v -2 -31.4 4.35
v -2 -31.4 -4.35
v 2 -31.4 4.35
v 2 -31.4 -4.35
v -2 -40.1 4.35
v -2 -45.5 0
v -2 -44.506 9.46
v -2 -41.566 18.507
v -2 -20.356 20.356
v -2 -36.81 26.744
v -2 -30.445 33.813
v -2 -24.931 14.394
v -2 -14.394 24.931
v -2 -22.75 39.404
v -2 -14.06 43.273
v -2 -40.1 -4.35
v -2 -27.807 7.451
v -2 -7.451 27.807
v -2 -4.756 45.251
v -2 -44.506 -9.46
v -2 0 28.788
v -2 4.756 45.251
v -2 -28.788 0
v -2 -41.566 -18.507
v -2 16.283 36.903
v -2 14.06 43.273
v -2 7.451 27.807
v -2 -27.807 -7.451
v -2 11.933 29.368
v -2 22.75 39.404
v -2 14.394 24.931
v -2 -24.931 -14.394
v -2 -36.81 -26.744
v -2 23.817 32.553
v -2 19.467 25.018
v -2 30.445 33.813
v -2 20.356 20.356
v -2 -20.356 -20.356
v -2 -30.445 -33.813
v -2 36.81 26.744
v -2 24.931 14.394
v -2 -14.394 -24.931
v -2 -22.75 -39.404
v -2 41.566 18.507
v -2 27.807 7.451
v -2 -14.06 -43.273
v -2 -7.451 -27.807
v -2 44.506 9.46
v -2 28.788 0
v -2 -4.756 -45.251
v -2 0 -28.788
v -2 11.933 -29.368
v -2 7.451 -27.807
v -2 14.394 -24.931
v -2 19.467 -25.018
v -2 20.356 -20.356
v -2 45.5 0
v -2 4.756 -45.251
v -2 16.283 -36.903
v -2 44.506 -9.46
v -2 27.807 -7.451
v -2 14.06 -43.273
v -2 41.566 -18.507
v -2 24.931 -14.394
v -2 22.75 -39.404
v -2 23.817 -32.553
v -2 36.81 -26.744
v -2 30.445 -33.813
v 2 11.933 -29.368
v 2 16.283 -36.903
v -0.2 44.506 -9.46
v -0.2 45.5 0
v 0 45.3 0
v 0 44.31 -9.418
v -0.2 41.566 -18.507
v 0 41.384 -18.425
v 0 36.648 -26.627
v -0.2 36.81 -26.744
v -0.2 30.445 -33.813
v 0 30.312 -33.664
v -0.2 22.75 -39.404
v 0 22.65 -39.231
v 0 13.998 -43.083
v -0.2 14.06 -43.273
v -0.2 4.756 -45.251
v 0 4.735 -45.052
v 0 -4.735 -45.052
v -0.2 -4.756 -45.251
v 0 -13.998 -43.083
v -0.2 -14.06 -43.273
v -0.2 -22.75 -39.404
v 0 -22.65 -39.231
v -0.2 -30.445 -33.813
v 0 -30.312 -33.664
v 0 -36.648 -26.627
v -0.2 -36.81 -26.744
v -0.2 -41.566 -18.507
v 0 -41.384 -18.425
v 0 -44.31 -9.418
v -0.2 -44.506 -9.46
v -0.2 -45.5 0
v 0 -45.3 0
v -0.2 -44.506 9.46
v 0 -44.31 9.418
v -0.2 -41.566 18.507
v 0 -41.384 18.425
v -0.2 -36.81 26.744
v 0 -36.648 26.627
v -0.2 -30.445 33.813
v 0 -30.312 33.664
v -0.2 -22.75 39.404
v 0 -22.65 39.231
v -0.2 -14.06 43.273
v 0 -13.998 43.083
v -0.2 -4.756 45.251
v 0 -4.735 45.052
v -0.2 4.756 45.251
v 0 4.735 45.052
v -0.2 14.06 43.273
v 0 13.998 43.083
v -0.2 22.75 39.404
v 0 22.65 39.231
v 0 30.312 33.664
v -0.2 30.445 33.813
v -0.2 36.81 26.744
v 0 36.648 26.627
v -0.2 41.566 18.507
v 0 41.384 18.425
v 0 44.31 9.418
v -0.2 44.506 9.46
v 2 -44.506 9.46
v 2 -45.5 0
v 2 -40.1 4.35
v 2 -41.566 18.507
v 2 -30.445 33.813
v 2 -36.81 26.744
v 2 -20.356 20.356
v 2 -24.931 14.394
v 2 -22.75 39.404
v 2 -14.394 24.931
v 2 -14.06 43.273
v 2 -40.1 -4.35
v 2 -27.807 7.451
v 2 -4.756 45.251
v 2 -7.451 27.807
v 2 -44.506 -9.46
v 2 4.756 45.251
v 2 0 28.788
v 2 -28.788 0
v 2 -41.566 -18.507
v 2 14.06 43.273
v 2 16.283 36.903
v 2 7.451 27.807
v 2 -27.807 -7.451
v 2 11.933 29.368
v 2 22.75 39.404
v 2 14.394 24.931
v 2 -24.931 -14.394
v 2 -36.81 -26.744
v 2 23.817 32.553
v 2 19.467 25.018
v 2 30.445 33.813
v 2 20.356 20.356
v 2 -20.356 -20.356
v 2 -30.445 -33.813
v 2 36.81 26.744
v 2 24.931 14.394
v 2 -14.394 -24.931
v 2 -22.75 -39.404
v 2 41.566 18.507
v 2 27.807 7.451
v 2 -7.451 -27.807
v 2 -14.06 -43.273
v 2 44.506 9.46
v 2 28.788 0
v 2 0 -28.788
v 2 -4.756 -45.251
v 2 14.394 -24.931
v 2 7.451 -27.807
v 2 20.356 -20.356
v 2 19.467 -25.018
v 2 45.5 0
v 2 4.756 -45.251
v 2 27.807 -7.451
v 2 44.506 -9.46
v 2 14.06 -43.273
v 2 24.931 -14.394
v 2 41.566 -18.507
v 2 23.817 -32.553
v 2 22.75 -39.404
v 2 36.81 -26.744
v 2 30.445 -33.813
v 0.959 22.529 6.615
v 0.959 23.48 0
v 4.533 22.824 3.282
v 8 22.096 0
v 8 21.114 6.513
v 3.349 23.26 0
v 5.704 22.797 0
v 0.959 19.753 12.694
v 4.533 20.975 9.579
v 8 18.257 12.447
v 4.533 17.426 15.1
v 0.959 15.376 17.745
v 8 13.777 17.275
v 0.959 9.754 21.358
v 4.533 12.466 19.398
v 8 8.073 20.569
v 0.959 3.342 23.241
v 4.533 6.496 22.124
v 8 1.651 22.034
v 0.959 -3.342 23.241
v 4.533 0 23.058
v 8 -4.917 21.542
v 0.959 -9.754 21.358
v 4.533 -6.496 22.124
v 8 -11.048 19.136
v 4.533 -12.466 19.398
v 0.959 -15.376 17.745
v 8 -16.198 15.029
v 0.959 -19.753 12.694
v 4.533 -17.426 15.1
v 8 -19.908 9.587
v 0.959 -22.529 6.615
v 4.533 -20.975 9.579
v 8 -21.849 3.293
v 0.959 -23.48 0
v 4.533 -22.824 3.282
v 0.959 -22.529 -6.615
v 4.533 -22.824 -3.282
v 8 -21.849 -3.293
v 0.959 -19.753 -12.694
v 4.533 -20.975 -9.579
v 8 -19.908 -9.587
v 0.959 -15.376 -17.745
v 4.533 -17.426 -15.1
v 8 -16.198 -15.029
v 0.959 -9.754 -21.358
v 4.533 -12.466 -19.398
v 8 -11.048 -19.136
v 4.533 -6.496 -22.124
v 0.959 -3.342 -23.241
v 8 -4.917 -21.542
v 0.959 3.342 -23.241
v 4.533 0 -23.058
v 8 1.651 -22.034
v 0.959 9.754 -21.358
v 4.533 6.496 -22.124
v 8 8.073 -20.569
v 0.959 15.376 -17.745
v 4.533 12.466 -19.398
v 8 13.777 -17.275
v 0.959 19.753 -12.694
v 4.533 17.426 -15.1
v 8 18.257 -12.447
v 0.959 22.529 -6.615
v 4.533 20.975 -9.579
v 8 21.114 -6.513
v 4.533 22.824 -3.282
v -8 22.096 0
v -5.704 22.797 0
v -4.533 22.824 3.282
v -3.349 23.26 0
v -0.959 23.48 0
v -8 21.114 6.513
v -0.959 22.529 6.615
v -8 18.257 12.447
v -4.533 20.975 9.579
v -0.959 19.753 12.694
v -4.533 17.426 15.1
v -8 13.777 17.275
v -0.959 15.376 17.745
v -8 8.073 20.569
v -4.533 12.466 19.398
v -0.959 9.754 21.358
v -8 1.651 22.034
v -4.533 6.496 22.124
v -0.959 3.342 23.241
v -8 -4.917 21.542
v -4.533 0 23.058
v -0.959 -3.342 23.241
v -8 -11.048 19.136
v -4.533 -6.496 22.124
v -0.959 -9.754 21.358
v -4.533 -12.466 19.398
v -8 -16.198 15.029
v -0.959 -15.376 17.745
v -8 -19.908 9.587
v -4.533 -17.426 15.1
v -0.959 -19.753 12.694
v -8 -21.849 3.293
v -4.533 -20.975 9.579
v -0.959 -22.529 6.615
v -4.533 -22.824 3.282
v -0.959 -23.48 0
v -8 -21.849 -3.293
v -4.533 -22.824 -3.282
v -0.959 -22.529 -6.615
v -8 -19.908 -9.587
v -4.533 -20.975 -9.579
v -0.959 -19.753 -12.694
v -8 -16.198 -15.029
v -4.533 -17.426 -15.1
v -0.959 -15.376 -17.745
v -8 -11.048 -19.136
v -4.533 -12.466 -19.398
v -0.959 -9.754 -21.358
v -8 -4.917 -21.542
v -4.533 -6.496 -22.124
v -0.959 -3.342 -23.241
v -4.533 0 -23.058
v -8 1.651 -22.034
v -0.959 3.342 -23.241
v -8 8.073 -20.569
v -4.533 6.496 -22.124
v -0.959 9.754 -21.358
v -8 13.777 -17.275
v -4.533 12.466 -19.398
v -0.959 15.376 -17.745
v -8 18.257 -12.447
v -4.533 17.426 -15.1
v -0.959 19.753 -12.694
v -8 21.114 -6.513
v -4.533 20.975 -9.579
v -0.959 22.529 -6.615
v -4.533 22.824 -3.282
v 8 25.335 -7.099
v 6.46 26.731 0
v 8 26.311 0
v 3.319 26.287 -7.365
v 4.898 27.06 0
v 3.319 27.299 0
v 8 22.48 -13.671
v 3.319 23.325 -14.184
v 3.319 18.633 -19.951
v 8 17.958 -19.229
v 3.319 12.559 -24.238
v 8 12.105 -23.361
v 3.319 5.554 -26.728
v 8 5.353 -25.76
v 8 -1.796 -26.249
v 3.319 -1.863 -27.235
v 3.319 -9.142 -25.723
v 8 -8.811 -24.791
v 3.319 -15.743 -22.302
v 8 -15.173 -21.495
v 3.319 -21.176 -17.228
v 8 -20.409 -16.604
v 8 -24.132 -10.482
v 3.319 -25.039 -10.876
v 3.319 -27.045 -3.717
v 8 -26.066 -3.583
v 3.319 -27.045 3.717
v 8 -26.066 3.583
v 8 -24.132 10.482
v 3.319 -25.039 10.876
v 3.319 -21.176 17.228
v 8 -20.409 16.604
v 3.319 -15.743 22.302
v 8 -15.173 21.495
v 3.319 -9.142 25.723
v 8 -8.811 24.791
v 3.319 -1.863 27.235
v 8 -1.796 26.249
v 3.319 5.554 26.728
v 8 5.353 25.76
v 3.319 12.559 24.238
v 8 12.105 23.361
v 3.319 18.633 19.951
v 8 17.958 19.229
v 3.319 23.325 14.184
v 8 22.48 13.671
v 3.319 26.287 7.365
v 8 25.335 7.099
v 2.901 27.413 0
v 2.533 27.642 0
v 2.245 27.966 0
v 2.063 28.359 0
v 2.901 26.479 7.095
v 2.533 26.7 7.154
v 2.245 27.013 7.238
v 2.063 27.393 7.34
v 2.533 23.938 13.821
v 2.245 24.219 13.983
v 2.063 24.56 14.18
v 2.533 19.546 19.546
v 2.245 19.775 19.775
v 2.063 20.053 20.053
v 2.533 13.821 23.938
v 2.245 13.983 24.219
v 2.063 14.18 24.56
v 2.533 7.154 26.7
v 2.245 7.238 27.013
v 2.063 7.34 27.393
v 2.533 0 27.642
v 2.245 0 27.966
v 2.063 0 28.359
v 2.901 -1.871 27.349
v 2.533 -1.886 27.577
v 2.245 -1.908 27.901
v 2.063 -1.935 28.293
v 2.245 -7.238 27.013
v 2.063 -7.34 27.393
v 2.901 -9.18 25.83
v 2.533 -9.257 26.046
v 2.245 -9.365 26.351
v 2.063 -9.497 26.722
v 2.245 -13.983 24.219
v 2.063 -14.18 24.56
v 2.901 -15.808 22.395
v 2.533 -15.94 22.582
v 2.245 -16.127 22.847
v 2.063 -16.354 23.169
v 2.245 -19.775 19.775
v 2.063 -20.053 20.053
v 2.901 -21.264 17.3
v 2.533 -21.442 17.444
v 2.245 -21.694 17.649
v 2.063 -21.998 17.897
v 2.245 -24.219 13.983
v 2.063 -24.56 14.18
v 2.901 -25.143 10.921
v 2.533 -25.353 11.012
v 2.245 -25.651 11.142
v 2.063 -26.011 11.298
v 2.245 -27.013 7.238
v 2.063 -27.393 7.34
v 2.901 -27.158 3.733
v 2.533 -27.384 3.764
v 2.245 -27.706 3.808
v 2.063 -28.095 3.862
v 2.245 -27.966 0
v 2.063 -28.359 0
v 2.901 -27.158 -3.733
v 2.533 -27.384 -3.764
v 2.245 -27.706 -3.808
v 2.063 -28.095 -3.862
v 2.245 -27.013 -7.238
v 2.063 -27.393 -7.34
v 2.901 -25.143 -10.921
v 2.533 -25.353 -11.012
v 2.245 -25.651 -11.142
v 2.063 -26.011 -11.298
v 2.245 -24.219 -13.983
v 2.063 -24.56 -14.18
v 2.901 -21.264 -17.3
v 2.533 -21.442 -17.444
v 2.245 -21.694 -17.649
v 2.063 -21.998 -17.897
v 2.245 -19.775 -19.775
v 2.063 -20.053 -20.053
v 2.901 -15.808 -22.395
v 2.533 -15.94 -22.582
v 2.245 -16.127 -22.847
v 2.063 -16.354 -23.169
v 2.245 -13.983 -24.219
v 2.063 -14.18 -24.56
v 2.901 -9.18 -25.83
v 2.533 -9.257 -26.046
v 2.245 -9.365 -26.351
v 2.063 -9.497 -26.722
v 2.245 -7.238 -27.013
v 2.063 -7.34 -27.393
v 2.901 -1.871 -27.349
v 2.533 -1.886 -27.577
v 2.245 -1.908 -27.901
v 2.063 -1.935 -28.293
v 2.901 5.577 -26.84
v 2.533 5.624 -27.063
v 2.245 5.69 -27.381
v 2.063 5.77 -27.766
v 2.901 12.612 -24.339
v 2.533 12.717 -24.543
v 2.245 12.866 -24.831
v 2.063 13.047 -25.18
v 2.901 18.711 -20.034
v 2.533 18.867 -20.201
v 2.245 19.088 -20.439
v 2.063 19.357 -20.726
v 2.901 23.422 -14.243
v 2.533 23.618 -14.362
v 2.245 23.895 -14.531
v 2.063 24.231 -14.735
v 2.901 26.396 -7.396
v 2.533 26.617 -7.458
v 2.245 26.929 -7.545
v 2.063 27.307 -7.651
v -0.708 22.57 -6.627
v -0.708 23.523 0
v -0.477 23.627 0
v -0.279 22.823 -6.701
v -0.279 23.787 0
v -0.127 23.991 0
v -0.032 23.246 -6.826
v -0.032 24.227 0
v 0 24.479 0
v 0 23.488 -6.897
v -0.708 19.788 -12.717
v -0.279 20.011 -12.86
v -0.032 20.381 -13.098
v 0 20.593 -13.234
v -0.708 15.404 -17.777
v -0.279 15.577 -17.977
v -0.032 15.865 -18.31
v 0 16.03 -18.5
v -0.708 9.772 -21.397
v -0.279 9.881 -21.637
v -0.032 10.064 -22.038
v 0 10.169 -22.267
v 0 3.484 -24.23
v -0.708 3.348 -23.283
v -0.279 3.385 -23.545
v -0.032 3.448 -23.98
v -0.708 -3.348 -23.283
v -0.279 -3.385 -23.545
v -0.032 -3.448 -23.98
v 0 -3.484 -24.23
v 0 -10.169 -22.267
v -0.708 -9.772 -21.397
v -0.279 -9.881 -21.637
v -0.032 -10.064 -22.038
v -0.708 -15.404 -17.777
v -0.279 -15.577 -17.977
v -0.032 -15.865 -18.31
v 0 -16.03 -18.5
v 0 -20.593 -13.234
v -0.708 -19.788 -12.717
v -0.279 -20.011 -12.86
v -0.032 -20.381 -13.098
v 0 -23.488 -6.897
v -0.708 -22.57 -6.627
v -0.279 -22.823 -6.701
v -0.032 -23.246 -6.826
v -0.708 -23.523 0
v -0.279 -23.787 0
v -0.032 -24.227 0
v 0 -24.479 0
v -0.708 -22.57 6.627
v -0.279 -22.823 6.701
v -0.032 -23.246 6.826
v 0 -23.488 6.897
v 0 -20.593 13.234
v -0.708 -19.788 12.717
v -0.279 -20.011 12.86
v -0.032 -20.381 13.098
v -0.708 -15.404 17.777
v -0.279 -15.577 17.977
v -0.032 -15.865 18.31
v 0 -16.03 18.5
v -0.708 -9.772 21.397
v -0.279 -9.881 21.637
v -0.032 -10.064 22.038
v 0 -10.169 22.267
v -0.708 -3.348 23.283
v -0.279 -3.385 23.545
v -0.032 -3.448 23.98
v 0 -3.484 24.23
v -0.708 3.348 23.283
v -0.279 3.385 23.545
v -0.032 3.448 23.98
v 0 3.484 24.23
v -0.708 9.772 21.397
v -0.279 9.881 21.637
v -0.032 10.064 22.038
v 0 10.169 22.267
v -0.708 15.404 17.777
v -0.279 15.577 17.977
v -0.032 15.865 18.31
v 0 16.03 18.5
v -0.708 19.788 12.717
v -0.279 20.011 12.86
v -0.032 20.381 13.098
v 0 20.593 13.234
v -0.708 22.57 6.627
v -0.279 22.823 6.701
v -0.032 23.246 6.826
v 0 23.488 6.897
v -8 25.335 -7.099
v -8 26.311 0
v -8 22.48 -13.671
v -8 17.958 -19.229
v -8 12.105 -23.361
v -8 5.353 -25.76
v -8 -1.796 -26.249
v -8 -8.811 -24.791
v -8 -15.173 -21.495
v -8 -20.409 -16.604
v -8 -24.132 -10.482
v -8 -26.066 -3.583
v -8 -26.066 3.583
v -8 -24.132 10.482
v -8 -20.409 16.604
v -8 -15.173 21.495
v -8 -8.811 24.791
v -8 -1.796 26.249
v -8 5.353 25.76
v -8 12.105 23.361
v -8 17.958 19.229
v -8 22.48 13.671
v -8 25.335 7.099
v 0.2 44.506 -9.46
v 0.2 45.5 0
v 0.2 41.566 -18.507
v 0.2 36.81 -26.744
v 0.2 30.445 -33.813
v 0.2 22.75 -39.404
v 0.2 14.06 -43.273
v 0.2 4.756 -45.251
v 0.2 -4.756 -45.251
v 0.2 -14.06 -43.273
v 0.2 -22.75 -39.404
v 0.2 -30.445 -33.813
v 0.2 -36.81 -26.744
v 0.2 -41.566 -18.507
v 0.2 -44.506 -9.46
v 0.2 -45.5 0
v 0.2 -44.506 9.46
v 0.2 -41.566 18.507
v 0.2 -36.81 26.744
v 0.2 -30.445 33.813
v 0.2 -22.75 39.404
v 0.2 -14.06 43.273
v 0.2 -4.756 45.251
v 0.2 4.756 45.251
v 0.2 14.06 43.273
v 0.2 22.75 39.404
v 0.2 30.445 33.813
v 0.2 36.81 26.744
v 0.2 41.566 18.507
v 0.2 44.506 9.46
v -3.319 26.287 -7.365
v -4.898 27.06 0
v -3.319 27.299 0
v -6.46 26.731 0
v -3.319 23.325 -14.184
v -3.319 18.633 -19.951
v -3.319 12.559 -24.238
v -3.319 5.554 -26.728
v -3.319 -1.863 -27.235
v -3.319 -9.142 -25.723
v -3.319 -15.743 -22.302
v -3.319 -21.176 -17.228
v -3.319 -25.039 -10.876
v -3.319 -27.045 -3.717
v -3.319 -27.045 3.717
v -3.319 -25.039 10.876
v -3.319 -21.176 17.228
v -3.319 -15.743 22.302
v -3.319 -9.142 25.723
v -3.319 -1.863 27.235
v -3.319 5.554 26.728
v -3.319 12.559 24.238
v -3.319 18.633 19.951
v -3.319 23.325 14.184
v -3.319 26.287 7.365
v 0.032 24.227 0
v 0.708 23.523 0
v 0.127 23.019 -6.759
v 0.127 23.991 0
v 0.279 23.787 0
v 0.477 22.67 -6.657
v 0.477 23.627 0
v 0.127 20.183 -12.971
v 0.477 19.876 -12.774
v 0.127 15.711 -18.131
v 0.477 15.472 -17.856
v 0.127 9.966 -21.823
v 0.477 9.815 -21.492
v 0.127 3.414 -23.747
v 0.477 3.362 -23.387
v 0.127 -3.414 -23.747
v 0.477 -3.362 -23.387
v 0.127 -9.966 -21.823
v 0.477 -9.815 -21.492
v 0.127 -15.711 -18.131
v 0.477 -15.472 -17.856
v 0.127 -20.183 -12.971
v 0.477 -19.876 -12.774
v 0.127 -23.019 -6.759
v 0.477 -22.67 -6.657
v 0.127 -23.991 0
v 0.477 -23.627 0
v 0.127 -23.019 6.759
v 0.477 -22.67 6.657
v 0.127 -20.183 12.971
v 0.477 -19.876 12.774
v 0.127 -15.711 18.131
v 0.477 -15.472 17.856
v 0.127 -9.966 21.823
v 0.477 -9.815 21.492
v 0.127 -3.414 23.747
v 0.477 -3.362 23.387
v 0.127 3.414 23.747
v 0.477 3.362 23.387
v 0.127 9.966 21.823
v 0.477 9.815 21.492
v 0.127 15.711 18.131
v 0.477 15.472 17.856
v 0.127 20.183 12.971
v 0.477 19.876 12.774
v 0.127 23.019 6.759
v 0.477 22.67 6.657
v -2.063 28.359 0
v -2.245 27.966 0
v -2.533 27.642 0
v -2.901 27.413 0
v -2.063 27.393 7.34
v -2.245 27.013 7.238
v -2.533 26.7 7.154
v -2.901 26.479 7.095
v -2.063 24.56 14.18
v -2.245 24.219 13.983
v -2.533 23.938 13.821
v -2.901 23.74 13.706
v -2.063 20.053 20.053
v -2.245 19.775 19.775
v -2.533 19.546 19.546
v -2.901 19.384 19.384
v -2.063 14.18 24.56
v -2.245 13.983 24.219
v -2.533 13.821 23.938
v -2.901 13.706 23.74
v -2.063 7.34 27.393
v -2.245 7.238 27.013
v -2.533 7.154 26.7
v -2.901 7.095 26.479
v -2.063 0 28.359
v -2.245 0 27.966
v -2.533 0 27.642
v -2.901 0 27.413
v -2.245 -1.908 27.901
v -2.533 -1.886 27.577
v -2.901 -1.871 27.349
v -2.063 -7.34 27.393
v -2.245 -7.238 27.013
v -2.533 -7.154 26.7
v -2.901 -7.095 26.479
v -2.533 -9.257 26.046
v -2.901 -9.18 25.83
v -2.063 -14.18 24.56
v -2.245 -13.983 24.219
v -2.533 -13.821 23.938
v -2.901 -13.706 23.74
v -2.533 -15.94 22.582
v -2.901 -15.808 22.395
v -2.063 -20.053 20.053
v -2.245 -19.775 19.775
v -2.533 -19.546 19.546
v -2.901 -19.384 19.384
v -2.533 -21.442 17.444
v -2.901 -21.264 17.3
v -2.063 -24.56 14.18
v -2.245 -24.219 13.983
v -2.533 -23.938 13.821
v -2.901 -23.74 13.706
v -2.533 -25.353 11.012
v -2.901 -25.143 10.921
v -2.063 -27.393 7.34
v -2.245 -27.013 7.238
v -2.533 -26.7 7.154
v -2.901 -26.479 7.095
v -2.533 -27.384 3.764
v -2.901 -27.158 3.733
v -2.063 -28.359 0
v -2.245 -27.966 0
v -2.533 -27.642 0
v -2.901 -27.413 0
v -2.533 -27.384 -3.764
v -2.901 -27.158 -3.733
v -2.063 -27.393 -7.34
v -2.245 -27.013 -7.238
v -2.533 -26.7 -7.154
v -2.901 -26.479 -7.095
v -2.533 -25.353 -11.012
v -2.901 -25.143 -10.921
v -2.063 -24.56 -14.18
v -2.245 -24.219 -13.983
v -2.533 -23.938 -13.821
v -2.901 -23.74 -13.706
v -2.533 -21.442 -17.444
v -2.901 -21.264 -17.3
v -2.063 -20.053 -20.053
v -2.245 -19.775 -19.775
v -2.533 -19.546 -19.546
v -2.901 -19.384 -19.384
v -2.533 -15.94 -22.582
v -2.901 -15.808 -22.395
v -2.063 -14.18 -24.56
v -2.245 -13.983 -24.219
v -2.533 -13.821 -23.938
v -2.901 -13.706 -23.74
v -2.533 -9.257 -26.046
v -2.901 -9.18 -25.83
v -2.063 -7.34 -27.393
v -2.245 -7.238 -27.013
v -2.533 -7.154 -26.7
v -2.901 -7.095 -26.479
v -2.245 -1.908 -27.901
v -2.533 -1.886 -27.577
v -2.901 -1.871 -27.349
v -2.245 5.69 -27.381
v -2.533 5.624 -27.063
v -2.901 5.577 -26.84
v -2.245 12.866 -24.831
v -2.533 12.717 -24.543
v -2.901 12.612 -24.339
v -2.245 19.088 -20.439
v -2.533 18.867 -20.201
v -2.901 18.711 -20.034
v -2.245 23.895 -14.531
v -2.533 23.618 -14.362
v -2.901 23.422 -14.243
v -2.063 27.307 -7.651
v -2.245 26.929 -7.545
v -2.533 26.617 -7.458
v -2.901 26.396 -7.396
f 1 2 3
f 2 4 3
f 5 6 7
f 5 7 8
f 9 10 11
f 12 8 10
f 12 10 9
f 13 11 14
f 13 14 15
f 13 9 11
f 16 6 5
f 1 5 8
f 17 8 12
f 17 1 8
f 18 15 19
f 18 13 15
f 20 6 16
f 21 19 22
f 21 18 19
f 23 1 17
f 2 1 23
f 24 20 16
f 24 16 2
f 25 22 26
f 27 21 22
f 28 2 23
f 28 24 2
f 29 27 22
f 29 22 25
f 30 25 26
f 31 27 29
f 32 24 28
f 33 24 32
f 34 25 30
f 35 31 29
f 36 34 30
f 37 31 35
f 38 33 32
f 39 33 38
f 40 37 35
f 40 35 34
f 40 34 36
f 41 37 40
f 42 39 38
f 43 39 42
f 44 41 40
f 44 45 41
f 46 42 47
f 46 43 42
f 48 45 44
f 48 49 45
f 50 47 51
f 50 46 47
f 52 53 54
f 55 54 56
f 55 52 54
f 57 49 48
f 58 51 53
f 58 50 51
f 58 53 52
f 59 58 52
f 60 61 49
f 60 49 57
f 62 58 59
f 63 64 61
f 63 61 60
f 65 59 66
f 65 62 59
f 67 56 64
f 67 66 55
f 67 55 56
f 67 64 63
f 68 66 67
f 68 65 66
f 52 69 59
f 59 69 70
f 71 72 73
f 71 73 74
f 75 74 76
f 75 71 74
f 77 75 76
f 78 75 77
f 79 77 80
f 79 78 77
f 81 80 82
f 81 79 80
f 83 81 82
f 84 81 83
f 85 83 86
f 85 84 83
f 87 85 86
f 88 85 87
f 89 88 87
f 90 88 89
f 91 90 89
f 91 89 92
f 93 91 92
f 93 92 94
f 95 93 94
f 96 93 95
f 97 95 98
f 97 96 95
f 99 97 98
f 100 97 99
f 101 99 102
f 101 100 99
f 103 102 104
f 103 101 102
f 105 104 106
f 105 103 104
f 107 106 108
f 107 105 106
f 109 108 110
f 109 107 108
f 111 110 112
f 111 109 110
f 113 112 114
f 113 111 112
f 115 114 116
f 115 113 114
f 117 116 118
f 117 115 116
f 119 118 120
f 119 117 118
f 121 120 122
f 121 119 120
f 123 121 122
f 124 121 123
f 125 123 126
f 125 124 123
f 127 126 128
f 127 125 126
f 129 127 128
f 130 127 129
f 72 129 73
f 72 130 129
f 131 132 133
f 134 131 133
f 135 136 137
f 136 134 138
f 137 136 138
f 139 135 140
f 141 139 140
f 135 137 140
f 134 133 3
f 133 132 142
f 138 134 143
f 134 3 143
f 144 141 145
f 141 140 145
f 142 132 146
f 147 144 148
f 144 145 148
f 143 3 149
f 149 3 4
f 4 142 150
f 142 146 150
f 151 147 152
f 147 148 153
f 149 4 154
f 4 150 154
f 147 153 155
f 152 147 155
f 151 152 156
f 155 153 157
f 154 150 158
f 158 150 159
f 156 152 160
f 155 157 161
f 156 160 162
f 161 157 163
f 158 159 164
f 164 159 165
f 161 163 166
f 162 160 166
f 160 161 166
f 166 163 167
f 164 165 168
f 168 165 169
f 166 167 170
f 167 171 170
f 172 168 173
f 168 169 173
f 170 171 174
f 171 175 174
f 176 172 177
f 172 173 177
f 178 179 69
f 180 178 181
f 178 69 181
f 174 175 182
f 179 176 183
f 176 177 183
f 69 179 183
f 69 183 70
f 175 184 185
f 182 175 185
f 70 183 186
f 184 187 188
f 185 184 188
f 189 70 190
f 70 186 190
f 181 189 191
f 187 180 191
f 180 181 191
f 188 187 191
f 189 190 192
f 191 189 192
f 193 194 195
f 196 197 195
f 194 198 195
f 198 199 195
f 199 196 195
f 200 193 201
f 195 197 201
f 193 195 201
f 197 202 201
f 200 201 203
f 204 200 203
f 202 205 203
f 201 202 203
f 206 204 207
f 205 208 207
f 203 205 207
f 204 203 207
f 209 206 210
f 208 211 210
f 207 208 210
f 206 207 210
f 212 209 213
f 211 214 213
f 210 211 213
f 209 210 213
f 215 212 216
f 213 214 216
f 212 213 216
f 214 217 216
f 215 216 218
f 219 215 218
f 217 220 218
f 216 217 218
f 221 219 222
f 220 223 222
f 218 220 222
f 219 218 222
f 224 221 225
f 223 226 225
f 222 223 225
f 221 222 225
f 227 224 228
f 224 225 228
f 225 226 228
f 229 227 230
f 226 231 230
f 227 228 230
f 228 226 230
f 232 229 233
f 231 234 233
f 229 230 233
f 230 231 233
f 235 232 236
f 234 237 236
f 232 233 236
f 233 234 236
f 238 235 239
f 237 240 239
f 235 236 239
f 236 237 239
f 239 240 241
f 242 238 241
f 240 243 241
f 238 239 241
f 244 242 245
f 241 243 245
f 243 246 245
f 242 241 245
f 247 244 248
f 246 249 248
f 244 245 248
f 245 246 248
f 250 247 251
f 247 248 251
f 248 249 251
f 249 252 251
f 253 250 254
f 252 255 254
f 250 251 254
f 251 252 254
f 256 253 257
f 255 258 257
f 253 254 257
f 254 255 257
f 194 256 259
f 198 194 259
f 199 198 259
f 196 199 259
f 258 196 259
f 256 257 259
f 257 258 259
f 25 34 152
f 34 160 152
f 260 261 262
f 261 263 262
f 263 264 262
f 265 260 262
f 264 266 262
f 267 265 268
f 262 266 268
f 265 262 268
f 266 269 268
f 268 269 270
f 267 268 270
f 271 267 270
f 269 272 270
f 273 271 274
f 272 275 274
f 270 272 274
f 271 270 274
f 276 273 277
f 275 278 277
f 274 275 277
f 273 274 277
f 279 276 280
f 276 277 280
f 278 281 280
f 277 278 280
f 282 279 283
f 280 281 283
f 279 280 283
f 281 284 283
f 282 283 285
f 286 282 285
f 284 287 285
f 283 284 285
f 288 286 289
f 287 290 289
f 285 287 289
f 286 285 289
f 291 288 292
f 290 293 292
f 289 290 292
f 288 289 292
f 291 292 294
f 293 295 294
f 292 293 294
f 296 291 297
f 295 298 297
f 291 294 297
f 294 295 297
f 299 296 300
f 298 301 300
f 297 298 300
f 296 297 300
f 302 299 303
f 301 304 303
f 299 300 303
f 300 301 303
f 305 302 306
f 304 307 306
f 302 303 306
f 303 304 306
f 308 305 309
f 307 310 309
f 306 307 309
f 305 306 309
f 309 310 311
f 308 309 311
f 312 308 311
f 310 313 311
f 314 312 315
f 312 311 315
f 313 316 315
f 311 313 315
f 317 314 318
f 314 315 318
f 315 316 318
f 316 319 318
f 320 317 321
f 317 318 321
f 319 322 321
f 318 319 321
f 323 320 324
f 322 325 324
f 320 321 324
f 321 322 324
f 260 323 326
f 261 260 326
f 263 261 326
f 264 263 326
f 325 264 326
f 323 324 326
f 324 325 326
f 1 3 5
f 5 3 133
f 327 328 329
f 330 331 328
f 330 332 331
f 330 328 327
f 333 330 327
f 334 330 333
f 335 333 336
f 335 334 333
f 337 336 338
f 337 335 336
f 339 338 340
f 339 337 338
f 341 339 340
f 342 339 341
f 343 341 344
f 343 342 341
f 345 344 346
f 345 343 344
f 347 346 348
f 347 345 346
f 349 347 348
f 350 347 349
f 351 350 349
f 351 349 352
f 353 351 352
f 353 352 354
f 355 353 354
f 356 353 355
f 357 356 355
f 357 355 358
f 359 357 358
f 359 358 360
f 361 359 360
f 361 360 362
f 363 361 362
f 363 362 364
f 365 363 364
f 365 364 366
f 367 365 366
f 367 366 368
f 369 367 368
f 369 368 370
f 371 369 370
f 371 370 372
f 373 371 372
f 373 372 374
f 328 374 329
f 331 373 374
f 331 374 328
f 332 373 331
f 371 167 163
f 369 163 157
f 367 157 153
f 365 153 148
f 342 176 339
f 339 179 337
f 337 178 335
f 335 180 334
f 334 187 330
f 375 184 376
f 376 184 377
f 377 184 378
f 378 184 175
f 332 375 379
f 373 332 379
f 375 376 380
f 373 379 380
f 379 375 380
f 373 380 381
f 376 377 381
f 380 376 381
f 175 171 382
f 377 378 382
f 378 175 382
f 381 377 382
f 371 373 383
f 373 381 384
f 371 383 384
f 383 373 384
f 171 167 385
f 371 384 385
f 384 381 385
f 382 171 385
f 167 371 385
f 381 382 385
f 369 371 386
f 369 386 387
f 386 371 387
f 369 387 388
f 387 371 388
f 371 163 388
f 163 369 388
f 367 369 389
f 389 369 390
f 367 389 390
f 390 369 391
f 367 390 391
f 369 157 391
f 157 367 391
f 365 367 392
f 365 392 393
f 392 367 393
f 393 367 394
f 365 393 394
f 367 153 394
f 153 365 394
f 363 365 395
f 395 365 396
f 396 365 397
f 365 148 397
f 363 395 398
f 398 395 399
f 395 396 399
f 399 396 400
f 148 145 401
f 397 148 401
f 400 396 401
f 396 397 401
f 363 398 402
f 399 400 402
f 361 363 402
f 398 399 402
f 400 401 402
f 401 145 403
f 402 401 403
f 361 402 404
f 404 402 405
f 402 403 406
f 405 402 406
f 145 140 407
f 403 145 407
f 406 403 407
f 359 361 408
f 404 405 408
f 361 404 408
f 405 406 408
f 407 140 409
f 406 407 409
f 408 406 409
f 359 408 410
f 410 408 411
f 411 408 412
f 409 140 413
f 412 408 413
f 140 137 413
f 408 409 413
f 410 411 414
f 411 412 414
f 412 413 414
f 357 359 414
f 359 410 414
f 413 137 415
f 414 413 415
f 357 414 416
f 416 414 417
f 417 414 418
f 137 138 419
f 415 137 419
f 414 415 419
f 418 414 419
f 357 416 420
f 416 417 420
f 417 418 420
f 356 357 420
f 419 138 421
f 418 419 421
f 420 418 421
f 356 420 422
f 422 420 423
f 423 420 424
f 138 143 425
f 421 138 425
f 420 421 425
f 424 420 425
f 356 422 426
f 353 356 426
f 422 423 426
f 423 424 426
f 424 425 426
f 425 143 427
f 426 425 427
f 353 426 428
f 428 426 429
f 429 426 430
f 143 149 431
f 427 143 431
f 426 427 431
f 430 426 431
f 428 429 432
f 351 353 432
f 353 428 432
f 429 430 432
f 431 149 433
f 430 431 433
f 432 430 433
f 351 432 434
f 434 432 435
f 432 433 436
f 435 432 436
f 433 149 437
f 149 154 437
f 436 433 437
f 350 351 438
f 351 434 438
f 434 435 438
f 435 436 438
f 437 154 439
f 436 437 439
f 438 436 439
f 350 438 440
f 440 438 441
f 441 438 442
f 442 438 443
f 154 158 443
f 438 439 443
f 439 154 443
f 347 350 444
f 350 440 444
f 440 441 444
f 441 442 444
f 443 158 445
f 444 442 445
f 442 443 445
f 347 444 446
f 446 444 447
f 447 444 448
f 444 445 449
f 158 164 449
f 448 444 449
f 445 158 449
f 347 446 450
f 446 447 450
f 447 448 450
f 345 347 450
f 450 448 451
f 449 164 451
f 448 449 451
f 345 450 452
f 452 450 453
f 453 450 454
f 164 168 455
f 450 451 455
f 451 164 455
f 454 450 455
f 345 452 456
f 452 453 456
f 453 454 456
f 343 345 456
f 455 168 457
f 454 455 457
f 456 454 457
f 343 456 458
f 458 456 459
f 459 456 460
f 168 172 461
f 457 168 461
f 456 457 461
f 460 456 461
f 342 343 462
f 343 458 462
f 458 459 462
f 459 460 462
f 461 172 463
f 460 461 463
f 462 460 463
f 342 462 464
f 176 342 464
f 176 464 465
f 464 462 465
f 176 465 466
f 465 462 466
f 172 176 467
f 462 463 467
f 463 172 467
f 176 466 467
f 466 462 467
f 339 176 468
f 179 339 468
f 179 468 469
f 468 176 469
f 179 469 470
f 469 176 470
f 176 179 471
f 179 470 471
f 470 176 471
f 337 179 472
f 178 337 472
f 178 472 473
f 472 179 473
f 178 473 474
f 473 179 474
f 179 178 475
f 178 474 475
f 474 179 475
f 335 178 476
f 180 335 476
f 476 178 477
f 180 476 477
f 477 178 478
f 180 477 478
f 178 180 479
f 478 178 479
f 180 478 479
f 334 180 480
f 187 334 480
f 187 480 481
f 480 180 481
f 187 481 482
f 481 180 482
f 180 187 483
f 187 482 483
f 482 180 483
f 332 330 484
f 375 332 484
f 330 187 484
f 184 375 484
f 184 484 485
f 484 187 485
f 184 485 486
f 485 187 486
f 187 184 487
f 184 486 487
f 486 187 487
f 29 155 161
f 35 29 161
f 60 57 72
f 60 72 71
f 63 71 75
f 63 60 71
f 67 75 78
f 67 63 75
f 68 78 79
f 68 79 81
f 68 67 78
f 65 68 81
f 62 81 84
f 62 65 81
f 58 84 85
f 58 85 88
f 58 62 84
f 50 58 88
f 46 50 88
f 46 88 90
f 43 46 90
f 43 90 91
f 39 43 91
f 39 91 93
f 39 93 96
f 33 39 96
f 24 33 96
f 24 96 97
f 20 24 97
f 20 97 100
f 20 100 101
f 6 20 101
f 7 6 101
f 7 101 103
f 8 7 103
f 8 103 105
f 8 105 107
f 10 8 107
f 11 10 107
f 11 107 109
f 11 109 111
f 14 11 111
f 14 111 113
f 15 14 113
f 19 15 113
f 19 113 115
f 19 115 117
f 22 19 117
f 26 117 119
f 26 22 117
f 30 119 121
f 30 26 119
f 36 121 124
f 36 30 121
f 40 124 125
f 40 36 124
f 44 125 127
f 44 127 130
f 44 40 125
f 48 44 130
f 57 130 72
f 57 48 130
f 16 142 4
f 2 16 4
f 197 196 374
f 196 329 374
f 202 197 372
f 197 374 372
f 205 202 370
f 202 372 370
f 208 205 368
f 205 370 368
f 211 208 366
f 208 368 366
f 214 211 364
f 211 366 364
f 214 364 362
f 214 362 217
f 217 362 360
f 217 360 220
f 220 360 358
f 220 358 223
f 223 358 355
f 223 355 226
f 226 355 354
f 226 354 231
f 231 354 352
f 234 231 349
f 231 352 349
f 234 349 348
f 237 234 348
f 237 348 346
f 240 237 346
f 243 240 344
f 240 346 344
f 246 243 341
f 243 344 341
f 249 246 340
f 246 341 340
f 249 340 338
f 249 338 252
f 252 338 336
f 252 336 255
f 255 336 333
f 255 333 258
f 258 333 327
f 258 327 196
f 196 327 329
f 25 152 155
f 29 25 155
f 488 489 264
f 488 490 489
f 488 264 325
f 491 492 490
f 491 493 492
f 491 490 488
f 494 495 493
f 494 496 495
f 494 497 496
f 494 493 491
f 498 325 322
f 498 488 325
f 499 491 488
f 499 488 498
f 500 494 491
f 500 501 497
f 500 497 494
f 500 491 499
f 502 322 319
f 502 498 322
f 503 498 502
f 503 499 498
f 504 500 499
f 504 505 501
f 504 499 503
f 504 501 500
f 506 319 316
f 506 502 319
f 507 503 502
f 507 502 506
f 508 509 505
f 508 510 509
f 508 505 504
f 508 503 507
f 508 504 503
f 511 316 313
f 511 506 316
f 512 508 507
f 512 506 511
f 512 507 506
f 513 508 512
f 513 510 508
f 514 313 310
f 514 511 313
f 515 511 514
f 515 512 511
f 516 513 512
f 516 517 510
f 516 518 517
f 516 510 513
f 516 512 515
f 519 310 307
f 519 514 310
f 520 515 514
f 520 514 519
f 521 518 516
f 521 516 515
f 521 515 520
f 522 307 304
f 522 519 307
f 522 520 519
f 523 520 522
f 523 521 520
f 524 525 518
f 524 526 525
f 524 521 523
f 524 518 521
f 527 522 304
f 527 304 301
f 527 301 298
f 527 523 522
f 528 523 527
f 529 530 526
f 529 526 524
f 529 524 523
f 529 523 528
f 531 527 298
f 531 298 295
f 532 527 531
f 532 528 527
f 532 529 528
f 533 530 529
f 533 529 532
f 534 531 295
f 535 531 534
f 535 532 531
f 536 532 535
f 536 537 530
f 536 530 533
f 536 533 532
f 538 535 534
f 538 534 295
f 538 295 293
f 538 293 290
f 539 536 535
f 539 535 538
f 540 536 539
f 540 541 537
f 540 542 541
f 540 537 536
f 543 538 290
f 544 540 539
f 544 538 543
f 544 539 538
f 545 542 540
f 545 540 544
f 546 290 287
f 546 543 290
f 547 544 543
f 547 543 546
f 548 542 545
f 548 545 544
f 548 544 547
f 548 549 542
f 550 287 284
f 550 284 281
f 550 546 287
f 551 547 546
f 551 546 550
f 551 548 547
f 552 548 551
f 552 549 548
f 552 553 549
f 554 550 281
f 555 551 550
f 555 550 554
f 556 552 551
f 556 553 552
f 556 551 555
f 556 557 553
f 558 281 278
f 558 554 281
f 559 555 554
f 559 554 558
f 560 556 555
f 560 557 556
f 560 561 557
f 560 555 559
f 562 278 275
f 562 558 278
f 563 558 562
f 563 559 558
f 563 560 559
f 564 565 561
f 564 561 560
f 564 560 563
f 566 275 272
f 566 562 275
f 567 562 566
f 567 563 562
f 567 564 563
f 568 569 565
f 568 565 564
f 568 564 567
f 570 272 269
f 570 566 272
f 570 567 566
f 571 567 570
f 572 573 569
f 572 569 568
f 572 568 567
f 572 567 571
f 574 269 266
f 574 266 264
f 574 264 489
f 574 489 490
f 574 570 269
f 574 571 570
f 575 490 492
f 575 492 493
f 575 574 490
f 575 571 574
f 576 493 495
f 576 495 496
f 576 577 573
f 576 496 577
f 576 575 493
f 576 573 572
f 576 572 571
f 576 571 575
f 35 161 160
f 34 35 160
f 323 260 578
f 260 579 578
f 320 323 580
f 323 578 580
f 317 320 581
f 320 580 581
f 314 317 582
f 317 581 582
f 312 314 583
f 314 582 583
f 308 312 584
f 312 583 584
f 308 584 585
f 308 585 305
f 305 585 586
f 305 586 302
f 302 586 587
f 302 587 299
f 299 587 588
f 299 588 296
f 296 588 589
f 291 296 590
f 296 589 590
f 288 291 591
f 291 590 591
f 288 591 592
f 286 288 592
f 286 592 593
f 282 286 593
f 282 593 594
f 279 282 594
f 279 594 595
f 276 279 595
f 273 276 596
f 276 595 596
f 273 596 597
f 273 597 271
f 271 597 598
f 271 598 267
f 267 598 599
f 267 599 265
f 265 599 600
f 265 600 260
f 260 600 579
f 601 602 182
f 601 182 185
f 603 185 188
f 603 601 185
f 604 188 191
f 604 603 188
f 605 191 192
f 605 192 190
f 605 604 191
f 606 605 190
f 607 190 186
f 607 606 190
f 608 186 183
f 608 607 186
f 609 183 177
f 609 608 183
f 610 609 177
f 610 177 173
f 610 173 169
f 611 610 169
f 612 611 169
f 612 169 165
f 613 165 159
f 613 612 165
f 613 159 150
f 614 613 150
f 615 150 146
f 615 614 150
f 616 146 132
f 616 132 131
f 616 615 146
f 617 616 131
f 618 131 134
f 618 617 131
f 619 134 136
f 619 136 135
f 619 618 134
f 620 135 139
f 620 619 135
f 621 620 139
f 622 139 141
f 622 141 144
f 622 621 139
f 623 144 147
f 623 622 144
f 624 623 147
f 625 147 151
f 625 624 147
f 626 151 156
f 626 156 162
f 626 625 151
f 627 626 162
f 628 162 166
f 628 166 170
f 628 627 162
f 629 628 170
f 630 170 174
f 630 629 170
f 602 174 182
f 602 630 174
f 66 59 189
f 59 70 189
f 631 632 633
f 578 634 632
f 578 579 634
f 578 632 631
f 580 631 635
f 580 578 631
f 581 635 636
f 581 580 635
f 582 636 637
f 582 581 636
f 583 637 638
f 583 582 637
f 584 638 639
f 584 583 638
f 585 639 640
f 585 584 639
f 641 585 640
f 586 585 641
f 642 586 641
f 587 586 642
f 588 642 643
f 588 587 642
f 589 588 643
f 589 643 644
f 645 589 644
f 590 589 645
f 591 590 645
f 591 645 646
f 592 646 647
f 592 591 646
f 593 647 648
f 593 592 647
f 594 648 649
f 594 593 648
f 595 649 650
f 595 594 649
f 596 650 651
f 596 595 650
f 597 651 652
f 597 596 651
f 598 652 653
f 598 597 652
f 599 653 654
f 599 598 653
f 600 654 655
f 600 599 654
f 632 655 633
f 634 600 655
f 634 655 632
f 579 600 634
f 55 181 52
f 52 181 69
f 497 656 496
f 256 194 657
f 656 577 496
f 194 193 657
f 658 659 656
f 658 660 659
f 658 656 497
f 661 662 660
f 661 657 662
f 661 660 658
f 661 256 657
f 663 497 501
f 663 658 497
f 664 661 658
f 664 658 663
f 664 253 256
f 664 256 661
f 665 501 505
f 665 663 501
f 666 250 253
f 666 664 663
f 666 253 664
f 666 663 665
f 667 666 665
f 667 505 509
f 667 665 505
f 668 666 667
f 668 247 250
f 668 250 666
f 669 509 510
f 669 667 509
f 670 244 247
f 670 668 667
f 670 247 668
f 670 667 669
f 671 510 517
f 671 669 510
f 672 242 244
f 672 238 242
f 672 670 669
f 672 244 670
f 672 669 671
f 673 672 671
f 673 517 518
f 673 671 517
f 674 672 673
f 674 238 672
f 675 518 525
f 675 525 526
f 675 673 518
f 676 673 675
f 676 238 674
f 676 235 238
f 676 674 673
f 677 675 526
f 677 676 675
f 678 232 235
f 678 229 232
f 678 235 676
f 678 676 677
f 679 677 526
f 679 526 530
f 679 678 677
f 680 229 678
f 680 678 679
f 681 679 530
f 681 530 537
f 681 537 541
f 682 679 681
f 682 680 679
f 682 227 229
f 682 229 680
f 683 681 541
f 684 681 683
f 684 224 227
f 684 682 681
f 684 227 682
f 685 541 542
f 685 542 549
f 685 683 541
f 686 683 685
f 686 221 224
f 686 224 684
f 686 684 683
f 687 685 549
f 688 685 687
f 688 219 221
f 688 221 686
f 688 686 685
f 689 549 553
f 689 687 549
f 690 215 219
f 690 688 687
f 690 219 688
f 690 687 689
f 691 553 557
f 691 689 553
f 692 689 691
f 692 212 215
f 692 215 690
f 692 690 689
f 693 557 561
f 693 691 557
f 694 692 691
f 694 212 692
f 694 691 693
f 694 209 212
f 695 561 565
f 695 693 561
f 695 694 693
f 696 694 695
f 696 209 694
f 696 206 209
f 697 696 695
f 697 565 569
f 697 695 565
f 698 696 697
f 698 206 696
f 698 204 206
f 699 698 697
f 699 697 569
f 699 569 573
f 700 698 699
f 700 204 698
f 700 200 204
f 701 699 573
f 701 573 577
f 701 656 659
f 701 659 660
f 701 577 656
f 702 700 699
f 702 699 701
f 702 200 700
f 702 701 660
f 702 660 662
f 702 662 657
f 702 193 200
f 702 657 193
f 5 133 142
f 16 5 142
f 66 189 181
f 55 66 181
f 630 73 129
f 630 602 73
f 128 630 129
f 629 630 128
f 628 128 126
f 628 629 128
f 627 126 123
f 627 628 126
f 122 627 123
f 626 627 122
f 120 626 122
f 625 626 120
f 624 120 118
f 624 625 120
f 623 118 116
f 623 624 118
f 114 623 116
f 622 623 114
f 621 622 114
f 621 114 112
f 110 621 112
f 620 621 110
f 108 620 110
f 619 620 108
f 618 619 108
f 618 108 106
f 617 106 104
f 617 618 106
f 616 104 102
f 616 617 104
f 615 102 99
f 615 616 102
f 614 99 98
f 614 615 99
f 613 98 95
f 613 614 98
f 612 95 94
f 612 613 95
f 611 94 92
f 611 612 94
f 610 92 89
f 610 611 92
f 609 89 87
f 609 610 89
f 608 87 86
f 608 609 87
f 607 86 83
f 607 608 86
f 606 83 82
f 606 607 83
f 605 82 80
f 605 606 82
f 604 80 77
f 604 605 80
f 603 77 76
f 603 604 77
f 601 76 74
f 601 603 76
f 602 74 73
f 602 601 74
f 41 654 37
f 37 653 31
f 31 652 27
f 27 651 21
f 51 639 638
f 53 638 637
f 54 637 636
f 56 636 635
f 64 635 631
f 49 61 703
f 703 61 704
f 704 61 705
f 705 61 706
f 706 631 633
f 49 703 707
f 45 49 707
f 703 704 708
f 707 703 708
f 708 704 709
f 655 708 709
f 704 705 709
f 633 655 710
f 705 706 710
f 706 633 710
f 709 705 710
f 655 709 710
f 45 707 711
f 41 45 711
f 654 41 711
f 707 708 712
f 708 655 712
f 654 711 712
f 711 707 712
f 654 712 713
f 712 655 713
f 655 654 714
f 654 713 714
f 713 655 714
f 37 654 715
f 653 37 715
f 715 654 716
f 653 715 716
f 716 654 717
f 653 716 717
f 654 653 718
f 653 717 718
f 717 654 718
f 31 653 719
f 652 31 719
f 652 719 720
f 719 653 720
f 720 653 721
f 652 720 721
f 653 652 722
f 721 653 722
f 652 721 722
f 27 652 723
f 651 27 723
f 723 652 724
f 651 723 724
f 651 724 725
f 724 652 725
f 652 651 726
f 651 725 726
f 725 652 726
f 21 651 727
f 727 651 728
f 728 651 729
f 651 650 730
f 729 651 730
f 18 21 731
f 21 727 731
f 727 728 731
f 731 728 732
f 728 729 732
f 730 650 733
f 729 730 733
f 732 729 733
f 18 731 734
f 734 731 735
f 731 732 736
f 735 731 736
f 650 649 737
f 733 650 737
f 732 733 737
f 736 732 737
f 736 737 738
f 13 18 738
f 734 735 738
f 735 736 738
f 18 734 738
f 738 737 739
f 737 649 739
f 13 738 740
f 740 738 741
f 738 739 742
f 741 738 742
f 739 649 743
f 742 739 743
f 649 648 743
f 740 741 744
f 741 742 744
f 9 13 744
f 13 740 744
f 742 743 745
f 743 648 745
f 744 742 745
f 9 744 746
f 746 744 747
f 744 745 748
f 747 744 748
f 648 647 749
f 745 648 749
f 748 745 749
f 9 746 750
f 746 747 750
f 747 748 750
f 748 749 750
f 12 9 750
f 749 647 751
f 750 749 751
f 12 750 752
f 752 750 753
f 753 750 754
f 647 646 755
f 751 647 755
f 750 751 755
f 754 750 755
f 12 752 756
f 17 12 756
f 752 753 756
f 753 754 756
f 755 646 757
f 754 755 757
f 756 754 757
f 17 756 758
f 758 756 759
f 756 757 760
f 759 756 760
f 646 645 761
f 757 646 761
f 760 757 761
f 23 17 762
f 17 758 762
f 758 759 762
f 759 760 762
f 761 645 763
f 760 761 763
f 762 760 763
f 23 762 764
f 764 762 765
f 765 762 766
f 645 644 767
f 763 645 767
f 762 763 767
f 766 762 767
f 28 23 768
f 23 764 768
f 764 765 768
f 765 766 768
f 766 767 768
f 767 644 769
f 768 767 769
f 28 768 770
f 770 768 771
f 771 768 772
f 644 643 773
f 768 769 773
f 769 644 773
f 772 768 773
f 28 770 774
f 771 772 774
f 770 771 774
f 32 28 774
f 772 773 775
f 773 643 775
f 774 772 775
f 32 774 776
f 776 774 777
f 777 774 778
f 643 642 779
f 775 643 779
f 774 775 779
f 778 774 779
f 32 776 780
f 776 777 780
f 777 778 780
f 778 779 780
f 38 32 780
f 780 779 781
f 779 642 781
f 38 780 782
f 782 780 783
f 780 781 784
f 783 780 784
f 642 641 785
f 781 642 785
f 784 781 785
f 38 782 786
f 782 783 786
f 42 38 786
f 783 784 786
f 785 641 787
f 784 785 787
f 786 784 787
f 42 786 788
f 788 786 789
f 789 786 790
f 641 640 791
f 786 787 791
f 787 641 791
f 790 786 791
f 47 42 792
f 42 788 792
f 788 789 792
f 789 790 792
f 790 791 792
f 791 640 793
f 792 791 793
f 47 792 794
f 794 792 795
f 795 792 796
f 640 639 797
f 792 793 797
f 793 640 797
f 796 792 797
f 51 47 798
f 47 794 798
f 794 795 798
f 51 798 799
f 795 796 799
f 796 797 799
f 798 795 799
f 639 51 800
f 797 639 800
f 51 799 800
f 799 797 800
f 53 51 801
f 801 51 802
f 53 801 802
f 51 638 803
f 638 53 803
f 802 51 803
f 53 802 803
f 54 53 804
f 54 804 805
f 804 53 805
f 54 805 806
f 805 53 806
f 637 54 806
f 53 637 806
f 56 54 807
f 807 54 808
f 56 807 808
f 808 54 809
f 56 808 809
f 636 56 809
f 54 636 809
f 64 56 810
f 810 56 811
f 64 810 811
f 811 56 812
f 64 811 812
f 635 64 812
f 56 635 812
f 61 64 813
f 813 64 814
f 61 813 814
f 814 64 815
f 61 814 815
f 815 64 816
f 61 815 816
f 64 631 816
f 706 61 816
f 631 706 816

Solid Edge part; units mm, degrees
sketch "Sketch1" plane through (0, 0, 0) normal (0, 0, 1) x (1, 0, 0)
  line L0 (-8, 26.3106) -> (-8, 22.096)
  arc A0 (-8, 22.096) -> (-0.9592, 23.4801) centre (0, 0) cw
  arc A1 (-0.9592, 23.4801) -> (0, 24.4792) centre (-1, 24.4792) ccw
  arc A2 (0, 24.4792) -> (0.9592, 23.4801) centre (1, 24.4792) ccw
  arc A3 (0.9592, 23.4801) -> (8, 22.096) centre (0, 0) cw
  line L1 (8, 22.096) -> (8, 26.3106)
  arc A4 (8, 26.3106) -> (3.319, 27.299) centre (0, 0) ccw
  arc A5 (3.319, 27.299) -> (2, 28.788) centre (3.5, 28.788) cw
  line L2 (2, 28.788) -> (2, 45.5)
  line L3 (2, 45.5) -> (0.2, 45.5)
  line L4 (0.2, 45.5) -> (0, 45.3)
  line L5 (0, 45.3) -> (-0.2, 45.5)
  line L6 (-0.2, 45.5) -> (-2, 45.5)
  line L7 (-2, 45.5) -> (-2, 28.788)
  arc A6 (-2, 28.788) -> (-3.319, 27.299) centre (-3.5, 28.788) cw
  arc A7 (-3.319, 27.299) -> (-8, 26.3106) centre (0, 0) ccw
revolve "RevolvedProtrusion1" add sketch "Sketch1" angle 360 about axis through (50, 0, 0) along (-1, 0, 0)
sketch "Sketch2" plane through (0, 0, 0) normal (1, 0, 0) x (0, 1, 0)
  line L0 (19.4672, -25.0182) -> (11.9328, -29.3682)
  line L1 (11.9328, -29.3682) -> (16.2828, -36.9026)
  line L2 (16.2828, -36.9026) -> (23.8172, -32.5526)
  line L3 (23.8172, -32.5526) -> (19.4672, -25.0182)
extrude "ExtrudedCutout_1" cut sketch "Sketch2" against normal blind 4 and the other way blind 4
sketch "Sketch3" plane through (0, 0, 0) normal (1, 0, 0) x (0, 1, 0)
  line L0 (-40.1, 4.35) -> (-40.1, -4.35)
  line L1 (-40.1, -4.35) -> (-31.4, -4.35)
  line L2 (-31.4, -4.35) -> (-31.4, 4.35)
  line L3 (-31.4, 4.35) -> (-40.1, 4.35)
extrude "ExtrudedCutout_2" cut sketch "Sketch3" against normal blind 4 and the other way blind 4
sketch "Sketch4" plane through (0, 0, 0) normal (1, 0, 0) x (0, 1, 0)
  line L0 (16.2828, 36.9026) -> (11.9328, 29.3682)
  line L1 (11.9328, 29.3682) -> (19.4672, 25.0182)
  line L2 (19.4672, 25.0182) -> (23.8172, 32.5526)
  line L3 (23.8172, 32.5526) -> (16.2828, 36.9026)
extrude "ExtrudedCutout_3" cut sketch "Sketch4" against normal blind 4 and the other way blind 4
properties material "Stainless steel"
